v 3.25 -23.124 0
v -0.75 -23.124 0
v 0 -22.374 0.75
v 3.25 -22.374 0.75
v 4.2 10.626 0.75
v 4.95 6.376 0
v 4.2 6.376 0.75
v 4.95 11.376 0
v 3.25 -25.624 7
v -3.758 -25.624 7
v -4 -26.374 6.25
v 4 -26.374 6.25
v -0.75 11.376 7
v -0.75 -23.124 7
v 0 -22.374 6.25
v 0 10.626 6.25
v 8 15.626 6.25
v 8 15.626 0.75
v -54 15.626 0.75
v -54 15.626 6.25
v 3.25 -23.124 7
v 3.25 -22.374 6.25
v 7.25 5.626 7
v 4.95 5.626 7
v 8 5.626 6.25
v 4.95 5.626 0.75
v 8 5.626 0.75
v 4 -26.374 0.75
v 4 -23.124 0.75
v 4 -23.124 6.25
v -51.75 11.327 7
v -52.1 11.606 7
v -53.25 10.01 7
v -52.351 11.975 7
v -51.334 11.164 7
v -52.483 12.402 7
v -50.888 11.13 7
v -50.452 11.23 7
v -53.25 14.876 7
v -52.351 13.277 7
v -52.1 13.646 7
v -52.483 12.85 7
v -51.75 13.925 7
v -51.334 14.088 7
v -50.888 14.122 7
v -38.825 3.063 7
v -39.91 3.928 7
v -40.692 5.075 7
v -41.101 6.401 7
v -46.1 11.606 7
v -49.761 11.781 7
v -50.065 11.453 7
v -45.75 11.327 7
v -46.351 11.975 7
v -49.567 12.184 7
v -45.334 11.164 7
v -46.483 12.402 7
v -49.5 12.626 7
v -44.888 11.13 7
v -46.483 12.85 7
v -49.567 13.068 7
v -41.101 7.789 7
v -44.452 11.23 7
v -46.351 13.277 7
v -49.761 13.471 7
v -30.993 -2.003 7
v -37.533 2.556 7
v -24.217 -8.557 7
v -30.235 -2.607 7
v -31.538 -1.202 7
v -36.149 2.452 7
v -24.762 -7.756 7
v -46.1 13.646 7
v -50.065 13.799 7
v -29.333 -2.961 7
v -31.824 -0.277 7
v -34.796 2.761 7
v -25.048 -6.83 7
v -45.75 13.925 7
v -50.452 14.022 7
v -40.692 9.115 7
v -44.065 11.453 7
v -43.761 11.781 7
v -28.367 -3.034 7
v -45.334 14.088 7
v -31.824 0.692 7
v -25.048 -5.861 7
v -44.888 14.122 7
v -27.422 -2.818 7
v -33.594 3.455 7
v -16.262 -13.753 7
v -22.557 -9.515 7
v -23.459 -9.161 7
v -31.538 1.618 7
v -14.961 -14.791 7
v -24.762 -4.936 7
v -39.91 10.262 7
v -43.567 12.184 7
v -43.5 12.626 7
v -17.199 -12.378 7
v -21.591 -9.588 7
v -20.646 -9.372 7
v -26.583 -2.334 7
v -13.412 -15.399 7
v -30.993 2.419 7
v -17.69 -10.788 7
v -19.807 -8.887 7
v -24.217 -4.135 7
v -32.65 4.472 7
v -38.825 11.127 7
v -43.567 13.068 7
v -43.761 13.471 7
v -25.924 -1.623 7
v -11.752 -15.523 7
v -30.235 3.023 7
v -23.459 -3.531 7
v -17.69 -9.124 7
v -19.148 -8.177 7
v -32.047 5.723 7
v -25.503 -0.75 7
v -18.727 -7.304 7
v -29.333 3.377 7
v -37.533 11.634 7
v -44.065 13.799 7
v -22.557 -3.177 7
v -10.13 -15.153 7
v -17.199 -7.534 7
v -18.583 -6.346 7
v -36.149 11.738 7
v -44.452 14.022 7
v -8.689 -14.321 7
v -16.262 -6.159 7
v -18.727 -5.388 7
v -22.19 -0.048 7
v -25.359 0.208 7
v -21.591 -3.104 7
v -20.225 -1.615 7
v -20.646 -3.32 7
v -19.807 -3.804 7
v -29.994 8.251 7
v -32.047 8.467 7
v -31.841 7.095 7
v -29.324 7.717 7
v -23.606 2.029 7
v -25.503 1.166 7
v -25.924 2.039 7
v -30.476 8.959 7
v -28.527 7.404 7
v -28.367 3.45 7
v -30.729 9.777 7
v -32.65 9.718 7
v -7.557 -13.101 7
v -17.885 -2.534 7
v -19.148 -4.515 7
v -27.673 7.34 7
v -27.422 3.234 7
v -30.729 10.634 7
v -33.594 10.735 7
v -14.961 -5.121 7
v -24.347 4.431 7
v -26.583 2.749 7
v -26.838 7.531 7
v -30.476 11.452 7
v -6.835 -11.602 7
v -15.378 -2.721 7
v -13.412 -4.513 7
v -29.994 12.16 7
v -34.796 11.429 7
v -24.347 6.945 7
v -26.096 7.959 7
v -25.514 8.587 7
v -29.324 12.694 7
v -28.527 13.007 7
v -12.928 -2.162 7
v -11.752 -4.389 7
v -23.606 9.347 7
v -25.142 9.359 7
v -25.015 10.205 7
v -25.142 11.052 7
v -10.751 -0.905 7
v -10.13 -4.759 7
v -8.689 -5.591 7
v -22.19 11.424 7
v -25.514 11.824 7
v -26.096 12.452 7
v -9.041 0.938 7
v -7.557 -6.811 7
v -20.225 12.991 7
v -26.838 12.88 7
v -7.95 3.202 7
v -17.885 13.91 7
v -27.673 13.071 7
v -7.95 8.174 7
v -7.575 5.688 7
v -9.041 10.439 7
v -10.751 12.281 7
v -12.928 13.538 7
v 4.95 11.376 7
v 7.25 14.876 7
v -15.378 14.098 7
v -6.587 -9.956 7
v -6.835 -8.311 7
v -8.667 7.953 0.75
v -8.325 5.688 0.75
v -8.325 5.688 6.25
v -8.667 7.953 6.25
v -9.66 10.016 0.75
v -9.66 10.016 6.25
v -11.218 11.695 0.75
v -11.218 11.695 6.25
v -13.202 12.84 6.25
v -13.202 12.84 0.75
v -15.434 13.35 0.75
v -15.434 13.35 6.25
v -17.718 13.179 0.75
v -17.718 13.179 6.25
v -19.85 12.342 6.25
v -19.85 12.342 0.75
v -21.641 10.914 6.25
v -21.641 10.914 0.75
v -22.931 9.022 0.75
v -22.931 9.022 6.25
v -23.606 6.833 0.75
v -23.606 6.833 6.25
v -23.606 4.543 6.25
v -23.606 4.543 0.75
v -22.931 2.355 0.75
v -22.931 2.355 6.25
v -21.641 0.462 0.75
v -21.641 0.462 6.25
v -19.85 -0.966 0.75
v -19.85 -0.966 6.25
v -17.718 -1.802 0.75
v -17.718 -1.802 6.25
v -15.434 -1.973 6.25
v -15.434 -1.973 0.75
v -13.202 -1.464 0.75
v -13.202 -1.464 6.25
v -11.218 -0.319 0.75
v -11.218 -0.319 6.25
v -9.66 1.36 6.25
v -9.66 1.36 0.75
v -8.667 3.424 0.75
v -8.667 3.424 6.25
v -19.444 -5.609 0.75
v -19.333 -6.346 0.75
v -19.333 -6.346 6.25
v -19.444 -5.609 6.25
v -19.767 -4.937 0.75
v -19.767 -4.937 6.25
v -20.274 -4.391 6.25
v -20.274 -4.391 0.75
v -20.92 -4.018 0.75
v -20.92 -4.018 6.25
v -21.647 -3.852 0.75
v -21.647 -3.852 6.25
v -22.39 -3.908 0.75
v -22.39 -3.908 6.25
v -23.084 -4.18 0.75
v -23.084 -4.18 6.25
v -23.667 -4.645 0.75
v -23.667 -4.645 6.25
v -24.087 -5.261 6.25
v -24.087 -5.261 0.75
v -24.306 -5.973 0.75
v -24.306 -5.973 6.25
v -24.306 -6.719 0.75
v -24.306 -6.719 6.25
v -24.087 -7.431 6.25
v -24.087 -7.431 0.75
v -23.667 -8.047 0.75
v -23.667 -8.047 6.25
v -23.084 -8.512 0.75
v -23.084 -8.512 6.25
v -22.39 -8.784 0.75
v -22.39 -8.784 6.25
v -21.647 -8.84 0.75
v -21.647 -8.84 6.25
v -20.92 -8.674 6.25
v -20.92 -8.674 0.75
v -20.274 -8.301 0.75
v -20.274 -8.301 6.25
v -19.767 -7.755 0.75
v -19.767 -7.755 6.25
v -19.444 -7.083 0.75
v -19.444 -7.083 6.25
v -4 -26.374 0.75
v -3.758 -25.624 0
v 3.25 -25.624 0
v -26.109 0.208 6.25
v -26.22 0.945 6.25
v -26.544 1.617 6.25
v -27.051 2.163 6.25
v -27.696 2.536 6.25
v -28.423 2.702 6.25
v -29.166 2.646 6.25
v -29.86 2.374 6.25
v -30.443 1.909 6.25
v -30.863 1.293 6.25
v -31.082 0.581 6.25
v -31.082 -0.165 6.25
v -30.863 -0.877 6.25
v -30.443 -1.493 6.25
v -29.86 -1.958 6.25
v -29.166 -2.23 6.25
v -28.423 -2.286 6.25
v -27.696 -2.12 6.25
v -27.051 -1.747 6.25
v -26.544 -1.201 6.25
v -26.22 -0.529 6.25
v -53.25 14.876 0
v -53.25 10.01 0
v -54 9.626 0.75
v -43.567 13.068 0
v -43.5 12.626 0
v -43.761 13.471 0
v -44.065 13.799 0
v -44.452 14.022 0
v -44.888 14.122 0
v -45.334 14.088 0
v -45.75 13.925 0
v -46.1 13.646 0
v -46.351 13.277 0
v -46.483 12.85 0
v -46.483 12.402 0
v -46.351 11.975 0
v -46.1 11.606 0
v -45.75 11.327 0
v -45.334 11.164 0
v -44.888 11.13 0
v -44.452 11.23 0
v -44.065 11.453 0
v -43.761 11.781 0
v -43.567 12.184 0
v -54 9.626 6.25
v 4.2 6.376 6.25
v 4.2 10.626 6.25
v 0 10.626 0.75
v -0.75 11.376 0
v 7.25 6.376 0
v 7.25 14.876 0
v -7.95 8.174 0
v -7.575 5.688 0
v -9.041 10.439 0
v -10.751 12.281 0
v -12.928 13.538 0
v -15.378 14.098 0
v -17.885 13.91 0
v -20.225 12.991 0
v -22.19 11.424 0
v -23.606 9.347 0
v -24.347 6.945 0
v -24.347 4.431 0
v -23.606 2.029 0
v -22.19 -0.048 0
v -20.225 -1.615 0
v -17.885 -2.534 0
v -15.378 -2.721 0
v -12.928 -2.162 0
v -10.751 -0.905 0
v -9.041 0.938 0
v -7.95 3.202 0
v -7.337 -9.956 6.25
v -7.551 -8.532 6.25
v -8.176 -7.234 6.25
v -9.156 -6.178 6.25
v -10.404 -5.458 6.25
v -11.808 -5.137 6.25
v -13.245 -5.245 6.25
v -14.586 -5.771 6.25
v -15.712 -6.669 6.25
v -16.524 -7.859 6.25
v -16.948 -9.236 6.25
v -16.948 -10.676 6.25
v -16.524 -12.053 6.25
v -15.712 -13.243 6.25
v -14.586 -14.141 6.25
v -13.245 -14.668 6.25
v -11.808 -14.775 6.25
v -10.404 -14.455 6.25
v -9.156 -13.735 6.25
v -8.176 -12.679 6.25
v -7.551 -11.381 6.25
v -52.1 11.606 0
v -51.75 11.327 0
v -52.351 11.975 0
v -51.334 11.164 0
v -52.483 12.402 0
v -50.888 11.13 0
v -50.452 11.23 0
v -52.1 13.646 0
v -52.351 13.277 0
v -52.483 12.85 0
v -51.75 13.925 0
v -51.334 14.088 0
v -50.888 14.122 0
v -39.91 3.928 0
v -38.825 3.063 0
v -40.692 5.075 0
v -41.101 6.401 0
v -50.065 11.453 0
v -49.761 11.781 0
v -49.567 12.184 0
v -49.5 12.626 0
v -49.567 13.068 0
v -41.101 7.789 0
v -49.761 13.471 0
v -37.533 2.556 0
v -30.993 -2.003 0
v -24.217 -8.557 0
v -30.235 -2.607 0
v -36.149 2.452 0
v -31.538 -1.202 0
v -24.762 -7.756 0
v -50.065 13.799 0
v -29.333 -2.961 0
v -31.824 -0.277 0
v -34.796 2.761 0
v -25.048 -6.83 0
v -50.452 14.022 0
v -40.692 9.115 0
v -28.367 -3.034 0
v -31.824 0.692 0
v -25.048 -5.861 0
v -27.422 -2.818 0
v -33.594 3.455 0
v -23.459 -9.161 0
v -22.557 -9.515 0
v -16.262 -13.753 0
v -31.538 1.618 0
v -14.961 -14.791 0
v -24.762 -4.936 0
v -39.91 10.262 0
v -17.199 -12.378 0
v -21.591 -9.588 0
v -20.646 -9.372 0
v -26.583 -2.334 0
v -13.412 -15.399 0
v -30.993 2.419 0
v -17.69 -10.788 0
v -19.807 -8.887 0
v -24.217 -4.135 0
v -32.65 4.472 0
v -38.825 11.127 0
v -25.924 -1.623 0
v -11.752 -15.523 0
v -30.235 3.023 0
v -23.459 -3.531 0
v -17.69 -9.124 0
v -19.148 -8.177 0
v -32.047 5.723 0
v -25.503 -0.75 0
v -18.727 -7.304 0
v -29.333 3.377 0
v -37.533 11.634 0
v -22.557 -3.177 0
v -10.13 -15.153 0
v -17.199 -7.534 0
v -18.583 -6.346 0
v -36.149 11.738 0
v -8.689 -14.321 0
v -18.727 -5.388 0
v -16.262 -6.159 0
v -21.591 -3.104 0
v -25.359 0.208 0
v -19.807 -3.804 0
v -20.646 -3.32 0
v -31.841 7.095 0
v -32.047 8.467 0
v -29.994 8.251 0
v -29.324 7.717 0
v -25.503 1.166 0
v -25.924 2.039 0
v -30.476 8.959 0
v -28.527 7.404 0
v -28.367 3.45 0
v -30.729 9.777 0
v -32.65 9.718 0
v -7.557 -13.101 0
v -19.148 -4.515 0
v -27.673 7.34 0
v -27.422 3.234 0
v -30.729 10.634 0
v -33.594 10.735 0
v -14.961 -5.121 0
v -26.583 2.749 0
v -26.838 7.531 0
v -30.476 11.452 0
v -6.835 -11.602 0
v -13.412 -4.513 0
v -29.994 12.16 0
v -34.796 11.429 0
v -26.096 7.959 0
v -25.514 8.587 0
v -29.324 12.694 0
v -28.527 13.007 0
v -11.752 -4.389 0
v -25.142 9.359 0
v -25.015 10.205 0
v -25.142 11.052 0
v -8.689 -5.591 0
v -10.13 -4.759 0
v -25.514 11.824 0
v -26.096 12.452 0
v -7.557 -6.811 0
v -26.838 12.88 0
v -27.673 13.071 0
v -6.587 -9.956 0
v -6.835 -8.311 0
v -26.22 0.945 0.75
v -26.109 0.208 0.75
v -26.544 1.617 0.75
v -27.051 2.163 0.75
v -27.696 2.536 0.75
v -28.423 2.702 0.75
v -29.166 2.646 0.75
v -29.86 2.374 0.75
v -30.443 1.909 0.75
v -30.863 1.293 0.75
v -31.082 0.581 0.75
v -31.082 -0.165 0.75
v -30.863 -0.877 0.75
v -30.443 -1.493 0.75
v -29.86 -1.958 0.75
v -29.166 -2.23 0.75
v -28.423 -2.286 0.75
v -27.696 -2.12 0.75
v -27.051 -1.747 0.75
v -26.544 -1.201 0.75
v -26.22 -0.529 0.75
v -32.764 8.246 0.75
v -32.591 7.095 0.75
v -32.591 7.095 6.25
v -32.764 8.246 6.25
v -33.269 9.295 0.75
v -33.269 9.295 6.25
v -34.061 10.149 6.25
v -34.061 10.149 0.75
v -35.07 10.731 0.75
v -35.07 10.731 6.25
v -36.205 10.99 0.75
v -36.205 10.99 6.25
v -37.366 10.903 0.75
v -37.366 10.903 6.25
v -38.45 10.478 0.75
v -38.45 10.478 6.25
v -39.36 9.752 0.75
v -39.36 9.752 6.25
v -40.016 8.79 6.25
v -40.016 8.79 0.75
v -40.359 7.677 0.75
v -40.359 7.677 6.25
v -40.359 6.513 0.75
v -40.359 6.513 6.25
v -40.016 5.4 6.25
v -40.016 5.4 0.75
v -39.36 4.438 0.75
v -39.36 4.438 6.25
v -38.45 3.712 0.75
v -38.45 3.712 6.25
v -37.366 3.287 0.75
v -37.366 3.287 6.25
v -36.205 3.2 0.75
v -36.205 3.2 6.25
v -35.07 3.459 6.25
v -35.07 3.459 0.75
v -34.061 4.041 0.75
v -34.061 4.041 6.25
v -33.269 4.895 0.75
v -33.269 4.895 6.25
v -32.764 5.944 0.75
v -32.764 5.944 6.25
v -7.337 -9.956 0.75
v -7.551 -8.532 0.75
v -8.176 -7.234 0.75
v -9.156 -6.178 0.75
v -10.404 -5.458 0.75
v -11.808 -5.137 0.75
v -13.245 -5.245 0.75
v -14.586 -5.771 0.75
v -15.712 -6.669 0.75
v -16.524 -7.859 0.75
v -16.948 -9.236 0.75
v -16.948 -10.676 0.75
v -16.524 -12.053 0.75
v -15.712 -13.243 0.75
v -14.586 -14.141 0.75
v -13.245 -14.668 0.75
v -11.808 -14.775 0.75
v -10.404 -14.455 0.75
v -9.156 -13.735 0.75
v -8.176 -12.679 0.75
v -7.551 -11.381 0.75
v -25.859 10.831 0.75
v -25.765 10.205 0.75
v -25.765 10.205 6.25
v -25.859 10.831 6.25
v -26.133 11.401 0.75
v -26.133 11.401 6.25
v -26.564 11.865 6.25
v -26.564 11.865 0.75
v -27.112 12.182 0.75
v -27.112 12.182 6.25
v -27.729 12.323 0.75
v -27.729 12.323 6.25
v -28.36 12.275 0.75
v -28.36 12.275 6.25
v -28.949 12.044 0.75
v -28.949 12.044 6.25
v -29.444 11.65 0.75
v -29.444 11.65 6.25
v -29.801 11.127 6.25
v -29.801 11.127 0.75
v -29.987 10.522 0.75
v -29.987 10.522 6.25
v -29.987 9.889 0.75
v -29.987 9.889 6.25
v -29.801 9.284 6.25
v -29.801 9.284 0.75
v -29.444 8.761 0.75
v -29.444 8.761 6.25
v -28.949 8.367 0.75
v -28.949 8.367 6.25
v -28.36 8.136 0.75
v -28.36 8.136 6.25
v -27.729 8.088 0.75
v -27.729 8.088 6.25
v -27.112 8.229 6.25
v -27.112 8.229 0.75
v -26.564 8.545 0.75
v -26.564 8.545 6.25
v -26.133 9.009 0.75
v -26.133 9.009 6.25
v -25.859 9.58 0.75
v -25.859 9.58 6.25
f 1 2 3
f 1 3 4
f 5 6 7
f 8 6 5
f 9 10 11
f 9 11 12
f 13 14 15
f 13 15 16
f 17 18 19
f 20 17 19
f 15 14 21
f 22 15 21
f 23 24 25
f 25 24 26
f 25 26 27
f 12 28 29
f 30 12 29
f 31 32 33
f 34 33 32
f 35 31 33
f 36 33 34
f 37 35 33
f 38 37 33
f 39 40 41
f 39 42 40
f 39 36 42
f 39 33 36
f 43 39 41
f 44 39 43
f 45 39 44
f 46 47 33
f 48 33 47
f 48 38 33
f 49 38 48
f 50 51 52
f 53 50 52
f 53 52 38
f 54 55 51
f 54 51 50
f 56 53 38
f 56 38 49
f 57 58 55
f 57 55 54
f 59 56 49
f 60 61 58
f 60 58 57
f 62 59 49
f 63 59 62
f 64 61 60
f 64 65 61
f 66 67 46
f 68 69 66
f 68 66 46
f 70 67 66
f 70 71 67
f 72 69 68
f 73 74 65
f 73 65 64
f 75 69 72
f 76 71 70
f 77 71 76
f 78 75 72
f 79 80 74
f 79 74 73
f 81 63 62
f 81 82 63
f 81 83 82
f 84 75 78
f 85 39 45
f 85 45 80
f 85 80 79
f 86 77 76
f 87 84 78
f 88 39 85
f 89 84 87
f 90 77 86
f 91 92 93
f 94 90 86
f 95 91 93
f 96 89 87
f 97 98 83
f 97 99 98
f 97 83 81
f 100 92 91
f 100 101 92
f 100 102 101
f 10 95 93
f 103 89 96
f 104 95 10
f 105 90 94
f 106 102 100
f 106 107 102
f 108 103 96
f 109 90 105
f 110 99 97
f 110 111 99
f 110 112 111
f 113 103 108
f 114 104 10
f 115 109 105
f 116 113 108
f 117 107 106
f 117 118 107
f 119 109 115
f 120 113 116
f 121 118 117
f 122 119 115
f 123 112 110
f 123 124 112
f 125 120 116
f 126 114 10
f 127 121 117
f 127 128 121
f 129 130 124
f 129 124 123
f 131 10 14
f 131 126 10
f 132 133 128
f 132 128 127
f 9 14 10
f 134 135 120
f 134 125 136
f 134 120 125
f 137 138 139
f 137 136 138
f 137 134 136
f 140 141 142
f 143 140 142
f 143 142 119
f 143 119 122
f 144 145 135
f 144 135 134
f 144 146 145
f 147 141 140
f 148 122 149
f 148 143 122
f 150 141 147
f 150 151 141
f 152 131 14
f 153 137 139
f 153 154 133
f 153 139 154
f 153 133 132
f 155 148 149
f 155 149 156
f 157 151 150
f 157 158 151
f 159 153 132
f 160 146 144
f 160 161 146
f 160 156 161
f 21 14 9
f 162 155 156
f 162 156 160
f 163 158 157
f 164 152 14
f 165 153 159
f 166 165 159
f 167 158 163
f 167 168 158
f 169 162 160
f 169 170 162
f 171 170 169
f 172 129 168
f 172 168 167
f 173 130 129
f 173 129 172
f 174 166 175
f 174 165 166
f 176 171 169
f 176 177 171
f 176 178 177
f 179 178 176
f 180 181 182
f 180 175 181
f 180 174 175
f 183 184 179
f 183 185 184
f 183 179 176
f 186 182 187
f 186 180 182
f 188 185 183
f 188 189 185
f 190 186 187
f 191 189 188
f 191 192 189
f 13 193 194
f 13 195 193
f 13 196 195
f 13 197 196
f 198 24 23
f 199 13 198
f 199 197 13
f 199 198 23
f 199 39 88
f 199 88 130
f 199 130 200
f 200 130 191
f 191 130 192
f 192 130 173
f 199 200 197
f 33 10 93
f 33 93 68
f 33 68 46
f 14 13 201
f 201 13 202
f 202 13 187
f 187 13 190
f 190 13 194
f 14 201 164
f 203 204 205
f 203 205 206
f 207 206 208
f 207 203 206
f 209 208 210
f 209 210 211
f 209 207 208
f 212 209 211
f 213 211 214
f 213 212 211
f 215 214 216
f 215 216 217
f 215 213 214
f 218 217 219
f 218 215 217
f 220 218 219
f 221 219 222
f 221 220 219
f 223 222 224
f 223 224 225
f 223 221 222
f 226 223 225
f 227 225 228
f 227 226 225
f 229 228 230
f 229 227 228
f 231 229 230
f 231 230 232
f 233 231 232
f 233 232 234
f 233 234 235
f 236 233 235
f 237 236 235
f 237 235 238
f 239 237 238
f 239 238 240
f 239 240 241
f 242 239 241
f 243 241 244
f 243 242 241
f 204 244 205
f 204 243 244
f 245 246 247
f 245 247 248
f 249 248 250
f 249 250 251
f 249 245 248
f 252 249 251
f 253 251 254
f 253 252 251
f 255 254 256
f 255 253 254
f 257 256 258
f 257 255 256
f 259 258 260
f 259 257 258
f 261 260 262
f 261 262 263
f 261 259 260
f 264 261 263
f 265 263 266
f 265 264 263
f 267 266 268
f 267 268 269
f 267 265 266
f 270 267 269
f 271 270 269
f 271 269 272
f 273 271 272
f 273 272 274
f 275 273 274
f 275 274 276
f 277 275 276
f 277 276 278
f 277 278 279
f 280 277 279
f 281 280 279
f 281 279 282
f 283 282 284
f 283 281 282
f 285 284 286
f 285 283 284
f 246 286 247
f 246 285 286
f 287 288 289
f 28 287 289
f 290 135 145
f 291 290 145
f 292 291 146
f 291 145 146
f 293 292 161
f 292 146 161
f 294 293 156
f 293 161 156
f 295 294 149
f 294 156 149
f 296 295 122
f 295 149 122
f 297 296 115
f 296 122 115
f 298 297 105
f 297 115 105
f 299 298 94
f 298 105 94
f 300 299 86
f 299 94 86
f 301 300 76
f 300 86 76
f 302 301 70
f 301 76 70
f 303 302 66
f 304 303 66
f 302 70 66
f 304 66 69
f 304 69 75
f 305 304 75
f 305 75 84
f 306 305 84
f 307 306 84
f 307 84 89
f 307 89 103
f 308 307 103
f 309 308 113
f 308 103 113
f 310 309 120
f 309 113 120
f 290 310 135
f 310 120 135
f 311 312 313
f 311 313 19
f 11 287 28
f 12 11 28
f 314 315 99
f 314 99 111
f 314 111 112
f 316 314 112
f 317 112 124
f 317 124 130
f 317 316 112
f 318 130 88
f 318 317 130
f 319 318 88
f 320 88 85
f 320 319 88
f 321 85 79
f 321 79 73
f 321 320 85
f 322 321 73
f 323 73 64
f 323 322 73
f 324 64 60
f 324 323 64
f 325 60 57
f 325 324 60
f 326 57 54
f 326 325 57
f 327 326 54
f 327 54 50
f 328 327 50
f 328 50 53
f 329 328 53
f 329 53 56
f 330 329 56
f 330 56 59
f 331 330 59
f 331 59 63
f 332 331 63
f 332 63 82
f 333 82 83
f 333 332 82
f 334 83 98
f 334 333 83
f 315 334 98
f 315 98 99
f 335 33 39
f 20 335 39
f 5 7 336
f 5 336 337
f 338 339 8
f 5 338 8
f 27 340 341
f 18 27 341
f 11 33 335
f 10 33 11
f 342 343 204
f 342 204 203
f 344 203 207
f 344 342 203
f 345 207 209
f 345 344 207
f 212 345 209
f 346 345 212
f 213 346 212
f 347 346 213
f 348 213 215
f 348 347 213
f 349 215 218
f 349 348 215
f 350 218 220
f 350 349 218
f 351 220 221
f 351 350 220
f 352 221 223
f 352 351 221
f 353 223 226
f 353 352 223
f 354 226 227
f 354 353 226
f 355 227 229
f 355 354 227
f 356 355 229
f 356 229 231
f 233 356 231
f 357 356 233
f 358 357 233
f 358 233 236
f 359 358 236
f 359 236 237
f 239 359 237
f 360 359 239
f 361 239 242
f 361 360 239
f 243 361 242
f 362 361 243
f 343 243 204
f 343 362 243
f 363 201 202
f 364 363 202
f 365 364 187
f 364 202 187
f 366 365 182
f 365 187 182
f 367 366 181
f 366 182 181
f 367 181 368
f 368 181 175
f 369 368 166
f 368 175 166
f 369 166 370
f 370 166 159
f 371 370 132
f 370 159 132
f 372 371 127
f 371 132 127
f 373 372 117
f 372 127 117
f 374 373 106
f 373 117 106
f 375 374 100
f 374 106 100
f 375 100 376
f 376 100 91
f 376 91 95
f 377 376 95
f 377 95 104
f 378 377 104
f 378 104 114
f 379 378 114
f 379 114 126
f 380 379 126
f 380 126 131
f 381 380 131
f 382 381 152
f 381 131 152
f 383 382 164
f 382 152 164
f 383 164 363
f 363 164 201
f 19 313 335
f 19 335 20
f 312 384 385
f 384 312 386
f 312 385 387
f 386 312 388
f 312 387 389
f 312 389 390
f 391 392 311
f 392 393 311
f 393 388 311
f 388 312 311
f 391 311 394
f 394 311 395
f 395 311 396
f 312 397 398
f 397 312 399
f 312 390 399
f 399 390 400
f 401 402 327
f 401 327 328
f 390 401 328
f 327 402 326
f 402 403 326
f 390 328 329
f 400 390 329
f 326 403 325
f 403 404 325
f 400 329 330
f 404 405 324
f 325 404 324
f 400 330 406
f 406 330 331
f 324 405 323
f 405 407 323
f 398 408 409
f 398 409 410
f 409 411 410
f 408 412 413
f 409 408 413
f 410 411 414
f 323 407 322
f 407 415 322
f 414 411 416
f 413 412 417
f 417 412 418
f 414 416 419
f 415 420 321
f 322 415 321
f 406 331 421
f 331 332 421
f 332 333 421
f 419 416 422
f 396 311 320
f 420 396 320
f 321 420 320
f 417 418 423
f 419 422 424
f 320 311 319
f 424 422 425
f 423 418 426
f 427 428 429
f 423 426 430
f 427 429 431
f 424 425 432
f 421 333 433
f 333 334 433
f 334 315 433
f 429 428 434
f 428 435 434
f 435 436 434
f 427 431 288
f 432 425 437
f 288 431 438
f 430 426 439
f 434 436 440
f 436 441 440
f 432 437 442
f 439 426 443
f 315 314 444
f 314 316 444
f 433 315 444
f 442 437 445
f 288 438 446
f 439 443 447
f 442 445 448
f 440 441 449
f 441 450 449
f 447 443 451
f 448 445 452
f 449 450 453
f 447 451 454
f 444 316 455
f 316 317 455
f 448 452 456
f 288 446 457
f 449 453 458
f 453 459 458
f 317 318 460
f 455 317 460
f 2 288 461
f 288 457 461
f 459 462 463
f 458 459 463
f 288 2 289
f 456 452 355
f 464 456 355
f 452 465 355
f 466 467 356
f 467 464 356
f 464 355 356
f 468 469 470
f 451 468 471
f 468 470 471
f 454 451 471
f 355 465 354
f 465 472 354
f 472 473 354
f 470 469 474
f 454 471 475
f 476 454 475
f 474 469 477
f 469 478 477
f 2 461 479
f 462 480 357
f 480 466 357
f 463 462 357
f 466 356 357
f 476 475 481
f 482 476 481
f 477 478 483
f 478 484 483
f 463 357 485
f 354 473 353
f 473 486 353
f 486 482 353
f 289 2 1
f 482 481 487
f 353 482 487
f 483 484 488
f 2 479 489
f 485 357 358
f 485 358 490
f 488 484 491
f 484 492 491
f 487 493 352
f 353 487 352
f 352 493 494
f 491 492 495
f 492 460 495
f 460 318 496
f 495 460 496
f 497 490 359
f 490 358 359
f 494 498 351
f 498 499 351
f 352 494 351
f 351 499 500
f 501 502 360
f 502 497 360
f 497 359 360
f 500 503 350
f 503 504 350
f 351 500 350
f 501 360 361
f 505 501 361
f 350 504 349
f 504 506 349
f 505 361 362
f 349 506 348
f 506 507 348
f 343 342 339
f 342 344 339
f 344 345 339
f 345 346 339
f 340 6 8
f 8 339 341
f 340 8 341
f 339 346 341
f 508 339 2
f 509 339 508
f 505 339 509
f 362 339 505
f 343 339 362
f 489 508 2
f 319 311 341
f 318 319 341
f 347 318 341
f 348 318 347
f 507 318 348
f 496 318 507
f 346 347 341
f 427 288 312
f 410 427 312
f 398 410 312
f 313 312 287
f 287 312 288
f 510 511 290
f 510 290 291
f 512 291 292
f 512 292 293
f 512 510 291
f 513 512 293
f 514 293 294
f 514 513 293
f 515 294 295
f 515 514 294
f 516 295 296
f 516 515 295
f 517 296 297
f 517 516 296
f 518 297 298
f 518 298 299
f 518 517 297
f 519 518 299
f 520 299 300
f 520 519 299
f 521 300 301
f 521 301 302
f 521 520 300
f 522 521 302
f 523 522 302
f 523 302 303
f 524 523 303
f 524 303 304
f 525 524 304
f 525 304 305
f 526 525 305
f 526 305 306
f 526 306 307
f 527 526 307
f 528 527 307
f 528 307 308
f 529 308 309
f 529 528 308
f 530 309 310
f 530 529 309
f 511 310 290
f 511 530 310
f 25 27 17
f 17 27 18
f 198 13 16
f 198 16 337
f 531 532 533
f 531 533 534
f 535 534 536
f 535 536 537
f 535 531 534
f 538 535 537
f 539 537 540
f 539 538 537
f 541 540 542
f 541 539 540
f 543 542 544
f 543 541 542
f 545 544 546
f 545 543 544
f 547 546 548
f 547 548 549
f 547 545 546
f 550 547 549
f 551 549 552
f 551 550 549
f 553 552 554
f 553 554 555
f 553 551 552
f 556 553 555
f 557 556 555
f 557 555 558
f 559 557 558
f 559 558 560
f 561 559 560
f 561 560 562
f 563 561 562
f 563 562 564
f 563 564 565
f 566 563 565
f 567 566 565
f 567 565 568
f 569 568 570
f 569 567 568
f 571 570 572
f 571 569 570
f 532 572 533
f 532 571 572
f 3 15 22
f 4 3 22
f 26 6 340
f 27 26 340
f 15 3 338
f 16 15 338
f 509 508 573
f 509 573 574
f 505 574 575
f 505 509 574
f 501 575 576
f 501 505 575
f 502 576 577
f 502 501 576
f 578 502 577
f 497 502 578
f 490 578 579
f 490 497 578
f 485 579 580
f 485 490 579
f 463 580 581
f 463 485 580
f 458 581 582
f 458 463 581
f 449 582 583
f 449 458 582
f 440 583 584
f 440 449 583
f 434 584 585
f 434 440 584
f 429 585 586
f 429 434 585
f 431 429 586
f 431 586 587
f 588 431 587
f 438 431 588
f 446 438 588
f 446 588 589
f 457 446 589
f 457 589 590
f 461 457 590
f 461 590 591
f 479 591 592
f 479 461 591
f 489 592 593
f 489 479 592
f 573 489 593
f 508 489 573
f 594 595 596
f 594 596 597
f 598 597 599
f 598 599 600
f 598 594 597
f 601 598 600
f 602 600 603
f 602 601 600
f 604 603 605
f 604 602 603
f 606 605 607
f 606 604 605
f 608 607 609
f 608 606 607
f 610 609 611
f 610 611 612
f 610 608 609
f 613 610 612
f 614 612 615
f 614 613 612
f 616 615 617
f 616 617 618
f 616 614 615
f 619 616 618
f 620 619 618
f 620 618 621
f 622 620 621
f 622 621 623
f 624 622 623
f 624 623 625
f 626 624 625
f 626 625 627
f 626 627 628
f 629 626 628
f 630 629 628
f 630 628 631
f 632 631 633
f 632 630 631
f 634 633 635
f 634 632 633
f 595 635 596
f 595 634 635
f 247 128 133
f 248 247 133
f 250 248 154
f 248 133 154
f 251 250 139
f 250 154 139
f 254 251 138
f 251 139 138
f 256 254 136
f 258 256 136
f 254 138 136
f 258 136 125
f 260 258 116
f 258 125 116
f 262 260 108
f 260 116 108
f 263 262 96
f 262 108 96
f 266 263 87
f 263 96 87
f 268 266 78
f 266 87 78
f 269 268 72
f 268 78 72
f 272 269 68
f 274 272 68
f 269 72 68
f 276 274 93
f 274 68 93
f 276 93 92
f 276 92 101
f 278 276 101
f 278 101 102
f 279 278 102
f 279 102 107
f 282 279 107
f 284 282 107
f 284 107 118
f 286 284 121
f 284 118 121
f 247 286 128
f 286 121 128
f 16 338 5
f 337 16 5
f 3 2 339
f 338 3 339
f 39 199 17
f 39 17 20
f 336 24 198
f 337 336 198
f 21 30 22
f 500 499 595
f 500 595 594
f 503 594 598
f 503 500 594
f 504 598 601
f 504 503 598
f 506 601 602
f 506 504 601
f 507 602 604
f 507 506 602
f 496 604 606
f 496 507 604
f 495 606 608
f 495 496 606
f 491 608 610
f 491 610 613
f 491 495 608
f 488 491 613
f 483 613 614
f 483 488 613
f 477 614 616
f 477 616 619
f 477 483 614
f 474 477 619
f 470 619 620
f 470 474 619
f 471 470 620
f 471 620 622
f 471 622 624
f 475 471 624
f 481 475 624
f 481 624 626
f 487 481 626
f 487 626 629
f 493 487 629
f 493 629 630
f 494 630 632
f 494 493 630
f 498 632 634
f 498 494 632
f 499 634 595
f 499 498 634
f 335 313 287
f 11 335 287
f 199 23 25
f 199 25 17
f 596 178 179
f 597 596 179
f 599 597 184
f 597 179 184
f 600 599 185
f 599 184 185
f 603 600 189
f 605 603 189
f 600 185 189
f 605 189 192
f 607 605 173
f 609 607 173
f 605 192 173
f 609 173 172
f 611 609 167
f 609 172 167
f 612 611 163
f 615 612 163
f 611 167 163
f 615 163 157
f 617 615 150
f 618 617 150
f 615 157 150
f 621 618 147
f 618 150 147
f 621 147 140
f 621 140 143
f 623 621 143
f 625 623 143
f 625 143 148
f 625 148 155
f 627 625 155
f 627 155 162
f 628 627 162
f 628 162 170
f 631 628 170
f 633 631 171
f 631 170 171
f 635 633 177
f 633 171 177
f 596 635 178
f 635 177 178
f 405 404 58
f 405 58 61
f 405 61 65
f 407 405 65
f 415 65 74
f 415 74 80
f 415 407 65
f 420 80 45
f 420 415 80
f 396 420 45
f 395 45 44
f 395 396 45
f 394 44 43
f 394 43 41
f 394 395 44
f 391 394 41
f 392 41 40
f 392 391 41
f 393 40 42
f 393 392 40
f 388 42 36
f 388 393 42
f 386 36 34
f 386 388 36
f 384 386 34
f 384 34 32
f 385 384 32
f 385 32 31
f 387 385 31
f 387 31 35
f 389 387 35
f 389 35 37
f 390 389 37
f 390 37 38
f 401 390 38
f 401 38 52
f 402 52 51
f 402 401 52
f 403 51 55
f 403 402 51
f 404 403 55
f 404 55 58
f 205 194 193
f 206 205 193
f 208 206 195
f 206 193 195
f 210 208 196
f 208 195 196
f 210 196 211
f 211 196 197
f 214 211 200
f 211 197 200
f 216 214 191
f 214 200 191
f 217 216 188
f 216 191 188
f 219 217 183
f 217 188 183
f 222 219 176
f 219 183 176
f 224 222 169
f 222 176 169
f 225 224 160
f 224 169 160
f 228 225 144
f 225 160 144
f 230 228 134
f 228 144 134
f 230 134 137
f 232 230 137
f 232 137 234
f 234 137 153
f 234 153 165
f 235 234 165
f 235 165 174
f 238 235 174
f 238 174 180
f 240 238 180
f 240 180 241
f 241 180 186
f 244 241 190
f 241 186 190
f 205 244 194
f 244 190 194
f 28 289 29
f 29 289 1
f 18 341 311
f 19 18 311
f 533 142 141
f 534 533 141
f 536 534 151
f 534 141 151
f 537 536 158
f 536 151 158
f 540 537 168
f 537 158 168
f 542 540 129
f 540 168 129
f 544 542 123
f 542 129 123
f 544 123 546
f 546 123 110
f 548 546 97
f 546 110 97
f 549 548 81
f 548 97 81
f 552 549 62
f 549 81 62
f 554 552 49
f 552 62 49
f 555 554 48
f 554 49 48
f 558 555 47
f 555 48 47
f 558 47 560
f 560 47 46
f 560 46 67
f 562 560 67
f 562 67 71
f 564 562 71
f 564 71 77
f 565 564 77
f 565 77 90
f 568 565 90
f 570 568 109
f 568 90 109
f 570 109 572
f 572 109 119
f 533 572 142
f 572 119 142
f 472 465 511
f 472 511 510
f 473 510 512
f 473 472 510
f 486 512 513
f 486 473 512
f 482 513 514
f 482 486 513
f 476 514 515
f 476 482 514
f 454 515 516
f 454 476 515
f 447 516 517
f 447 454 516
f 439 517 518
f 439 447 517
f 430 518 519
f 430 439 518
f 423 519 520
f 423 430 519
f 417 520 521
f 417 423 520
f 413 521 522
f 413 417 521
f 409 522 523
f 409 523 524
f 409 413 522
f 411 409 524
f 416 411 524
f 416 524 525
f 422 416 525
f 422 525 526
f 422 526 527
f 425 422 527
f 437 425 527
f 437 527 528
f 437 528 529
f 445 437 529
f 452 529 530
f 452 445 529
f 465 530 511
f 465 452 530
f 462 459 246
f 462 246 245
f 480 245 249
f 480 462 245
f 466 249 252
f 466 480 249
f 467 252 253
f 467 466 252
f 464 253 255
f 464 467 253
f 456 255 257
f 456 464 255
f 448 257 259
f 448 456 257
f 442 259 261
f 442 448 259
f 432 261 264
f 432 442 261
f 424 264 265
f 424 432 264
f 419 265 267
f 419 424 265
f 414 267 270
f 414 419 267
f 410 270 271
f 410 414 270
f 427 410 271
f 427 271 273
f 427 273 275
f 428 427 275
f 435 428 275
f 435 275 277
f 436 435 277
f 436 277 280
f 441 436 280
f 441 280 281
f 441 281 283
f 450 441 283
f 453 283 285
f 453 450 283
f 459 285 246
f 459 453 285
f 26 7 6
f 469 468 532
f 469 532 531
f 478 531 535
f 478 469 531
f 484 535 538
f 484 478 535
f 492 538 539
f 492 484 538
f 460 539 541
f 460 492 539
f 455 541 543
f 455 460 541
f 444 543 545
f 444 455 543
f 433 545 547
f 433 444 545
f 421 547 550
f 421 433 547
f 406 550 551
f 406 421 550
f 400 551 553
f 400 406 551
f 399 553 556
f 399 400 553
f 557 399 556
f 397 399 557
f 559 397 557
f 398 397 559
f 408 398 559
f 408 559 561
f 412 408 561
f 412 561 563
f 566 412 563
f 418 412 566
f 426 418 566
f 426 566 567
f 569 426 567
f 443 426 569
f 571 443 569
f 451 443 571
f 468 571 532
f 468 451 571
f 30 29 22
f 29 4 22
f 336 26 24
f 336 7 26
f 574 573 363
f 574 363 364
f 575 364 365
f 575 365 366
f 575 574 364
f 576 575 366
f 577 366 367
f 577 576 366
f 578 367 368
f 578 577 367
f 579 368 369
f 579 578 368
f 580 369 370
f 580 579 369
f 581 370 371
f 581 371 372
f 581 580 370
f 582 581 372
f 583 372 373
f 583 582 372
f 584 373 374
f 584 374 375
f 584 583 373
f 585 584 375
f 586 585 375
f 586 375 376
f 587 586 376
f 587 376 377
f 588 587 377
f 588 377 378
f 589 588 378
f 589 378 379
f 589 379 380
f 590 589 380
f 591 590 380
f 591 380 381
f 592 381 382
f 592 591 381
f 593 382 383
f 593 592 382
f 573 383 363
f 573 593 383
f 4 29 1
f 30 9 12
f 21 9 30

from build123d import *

# Parameters (mm, degrees)
F0_W     = 3.8
F0_H     = 5
F0_W_2   = 4
F0_H_2   = 4
F0_R     = 2.5006647493
F0_R_2   = 4.8327220748
F0_R_3   = 3.906097333
F0_R_4   = 2.1231290944
F0_R_5   = 7.6831288046
F0_W_3   = 12
F0_H_3   = 6
F0_R_6   = 1.5
F1_DEPTH = 7
F2_SIZE  = 0.75


# Not quite as in the source:
# - a feature names something its author has since deleted; it is built from what else it names


with BuildPart() as f1:
    # F0 (on Top) → F1 (new body)
    with BuildSketch(Plane.XY):
        Polygon((0, 10.6260057762), (0, 15.6260057762), (-4, 15.6260057762), (-4, -26.3739942238), (0, -26.3739942238), (0, -22.3739942238), align=None)
        Polygon((8, 15.6260057762), (0, 15.6260057762), (0, 10.6260057762), (4.2, 10.6260057762), (8, 10.6260057762), align=None)
        with Locations((6.1, 8.1260057762)):
            Rectangle(F0_W, F0_H)
        with Locations((2, -24.3739942238)):
            Rectangle(F0_W_2, F0_H_2)
        Polygon((-4, -26.3739942238), (-4, 15.6260057762), (-42, 15.6260057762), (-42, 9.6260057762), (-54, 9.6260057762), align=None)
        with Locations((-21.8336265534, -6.3459714875)):
            Circle(F0_R, mode=Mode.SUBTRACT)
        with Locations((-12.1693955734, -9.9561735988)):
            Circle(F0_R_2, mode=Mode.SUBTRACT)
        with Locations((-28.6096986383, 0.2079327387)):
            Circle(F0_R, mode=Mode.SUBTRACT)
        with Locations((-36.4965982735, 7.095086854)):
            Circle(F0_R_3, mode=Mode.SUBTRACT)
        with Locations((-27.8876554221, 10.2054132149)):
            Circle(F0_R_4, mode=Mode.SUBTRACT)
        with Locations((-16.008509323, 5.6881718338)):
            Circle(F0_R_5, mode=Mode.SUBTRACT)
        with Locations((-48, 12.6260057762)):
            Rectangle(F0_W_3, F0_H_3)
        with Locations((-51, 12.6260057762)):
            Circle(F0_R_6, mode=Mode.SUBTRACT)
        with Locations((-45, 12.6260057762)):
            Circle(F0_R_6, mode=Mode.SUBTRACT)
    extrude(amount=F1_DEPTH)

    # F2
    f2_edges = [f1.edges().sort_by_distance(p)[0] for p in [
        (4.2, 5.626006, 3.5),
        (4, -22.373994, 3.5),
        (-17.002118, -9.956174, 0),
        (-31.110363, 0.207933, 0),
        (-40.402696, 7.095087, 7),
        (-40.402696, 7.095087, 0),
        (-30.010785, 10.205413, 0),
        (-23.691638, 5.688172, 0),
        (0, -5.873994, 0),
        (2.1, 10.626006, 0),
        (4.2, 8.126006, 0),
        (6.1, 5.626006, 0),
        (8, 10.626006, 0),
        (-23, 15.626006, 0),
        (-54, 12.626006, 0),
        (-29, -8.373994, 0),
        (0, -26.373994, 0),
        (4, -24.373994, 0),
        (2, -22.373994, 0),
        (-23, 15.626006, 7),
        (-54, 12.626006, 7),
        (-29, -8.373994, 7),
        (-30.010785, 10.205413, 7),
        (-31.110363, 0.207933, 7),
        (-23.691638, 5.688172, 7),
        (-17.002118, -9.956174, 7),
        (0, -26.373994, 7),
        (4, -24.373994, 7),
        (2, -22.373994, 7),
        (0, -5.873994, 7),
        (8, 10.626006, 7),
        (2.1, 10.626006, 7),
        (4.2, 8.126006, 7),
        (-24.334291, -6.345971, 7),
        (-24.334291, -6.345971, 0),
    ]]
    chamfer(f2_edges, length=F2_SIZE)


solid = f1.part
